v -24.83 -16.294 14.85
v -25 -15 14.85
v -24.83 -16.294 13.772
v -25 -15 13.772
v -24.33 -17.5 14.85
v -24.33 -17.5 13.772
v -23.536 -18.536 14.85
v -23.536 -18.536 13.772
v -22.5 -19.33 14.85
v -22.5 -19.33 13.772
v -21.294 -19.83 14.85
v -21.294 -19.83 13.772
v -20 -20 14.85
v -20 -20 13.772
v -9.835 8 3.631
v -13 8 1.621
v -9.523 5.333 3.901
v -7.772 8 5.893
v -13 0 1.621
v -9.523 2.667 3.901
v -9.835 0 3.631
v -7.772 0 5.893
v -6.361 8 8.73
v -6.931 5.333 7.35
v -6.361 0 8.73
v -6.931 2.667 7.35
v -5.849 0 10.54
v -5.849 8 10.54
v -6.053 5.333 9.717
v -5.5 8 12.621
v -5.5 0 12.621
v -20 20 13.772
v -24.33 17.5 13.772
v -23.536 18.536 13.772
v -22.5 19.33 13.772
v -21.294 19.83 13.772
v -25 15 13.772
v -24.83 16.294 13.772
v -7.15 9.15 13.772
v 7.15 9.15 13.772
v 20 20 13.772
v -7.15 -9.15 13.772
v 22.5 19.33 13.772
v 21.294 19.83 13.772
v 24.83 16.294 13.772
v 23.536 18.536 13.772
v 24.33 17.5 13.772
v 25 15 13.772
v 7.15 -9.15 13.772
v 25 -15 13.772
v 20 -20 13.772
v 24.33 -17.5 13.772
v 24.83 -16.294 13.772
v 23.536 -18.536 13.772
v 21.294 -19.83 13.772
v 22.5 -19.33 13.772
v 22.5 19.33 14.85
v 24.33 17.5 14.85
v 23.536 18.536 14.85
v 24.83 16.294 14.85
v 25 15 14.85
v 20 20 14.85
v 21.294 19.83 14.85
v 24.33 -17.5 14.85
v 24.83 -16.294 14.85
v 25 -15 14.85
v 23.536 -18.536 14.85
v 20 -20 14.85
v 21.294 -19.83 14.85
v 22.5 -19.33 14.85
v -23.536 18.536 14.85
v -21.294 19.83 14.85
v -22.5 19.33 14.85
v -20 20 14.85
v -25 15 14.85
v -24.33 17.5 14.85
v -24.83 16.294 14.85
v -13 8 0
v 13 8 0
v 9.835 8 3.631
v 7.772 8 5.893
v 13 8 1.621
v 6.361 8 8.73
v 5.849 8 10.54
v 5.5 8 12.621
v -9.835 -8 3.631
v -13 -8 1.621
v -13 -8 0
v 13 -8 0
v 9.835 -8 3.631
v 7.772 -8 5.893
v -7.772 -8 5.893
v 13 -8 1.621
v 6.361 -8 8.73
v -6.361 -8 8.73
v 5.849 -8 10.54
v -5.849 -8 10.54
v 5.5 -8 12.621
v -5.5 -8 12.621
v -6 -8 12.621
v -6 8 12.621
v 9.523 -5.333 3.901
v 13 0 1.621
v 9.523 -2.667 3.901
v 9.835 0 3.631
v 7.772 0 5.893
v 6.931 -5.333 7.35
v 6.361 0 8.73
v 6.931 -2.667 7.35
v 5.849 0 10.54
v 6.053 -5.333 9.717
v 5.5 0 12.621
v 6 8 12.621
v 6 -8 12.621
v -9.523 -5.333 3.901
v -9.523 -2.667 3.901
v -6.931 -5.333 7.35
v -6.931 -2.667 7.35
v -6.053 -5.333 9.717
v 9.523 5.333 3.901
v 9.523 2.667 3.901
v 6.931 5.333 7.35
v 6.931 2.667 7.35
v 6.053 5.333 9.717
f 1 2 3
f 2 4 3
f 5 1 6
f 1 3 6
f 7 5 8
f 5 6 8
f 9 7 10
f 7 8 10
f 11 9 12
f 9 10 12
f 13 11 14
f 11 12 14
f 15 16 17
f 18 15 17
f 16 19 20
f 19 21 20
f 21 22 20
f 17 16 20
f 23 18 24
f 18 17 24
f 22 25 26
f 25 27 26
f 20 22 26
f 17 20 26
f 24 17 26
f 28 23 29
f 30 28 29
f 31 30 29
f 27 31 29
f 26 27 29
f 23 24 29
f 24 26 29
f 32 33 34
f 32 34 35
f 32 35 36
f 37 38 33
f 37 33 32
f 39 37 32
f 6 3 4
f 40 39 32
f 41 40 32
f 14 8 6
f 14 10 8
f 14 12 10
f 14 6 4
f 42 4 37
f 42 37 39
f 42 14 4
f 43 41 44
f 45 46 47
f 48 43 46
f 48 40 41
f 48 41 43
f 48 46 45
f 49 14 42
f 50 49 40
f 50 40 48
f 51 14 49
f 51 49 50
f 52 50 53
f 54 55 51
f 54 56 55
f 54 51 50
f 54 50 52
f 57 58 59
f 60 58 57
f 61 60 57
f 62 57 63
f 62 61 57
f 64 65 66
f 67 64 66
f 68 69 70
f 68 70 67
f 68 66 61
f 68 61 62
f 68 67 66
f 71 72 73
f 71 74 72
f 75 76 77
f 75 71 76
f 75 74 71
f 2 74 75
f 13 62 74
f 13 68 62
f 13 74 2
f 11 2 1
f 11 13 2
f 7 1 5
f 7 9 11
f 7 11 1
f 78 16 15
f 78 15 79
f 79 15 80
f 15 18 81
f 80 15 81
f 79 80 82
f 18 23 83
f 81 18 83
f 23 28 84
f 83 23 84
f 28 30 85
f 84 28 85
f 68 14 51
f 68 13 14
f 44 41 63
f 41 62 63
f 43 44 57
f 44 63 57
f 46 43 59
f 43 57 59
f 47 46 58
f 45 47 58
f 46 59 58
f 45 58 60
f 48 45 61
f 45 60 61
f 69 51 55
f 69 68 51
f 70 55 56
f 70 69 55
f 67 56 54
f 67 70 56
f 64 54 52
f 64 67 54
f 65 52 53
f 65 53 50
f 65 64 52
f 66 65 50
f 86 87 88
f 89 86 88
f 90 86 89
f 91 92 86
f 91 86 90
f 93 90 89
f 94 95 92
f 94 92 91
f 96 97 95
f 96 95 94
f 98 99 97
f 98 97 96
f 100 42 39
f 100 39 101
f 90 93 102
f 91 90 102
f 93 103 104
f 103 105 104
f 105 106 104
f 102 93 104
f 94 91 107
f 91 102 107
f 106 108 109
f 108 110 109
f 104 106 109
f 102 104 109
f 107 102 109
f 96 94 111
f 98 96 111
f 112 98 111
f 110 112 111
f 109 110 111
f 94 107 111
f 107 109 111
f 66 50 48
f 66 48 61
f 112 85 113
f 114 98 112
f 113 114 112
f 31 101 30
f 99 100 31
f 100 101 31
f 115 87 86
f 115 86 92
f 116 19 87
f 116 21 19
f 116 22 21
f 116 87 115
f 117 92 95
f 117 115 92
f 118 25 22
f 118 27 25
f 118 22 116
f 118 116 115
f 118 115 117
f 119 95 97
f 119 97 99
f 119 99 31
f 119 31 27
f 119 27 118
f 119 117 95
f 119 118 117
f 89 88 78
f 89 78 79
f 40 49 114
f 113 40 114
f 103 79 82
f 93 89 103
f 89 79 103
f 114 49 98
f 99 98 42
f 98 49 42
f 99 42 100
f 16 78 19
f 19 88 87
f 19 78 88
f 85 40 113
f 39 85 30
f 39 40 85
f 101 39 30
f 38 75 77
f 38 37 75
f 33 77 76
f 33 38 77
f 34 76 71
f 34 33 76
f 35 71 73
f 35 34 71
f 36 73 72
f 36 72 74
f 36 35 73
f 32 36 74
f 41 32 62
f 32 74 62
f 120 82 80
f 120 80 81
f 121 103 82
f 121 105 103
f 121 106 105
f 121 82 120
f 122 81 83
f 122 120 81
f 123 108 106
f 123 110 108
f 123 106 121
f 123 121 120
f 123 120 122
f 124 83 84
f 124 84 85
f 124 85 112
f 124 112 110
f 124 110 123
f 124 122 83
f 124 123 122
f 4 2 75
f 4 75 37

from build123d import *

# Parameters (mm, degrees)
F1_DEPTH     = 20
F2_DEPTH     = 13
F0_W         = 13
F0_H         = 1.6210871795
F3_T4_DEPTH  = 22
F3_T9_DEPTH  = 26
F3_T14_DEPTH = 26
F3_T19_DEPTH = 22
F3_T25_DEPTH = 38.8584149398
F3_T30_DEPTH = 34.8584149398
F3_T38_DEPTH = 34.8584149398
F3_T43_DEPTH = 38.8584149398
F3_T51_DEPTH = 38.8584149398
F3_T56_DEPTH = 34.8584149398
F3_T64_DEPTH = 38.8584149398
F3_T69_DEPTH = 34.8584149398
F4_R         = 5
F5_R         = 5
F7_DEPTH     = 8


# Not quite as in the source:
# - a fillet or chamfer that OpenCascade refuses, or shapes differently, is made with other operations: its cross-section is extruded or revolved along the edge and cut away or added


with BuildPart() as f1:
    # F0 (on Front) → F1 (new body, symmetric)
    with BuildSketch(Plane.XZ):
        Polygon((0, 13.7715177082), (0, 14.85), (-25, 14.85), (-25, 13.7715177082), (-11, 13.7715177082), align=None)
        Polygon((25, 14.85), (0, 14.85), (0, 13.7715177082), (11, 13.7715177082), (25, 13.7715177082), align=None)
    extrude(amount=F1_DEPTH, both=True)

    # F0 (on Front) → F2 (join, symmetric)
    with BuildSketch(Plane.XZ):
        Polygon((0, 12.6210871795), (0, 13.7715177082), (-11, 13.7715177082), (-11, 12.6210871795), (-5.5, 12.6210871795), align=None)
        Polygon((11, 13.7715177082), (0, 13.7715177082), (0, 12.6210871795), (5.5, 12.6210871795), (11, 12.6210871795), align=None)
    extrude(amount=F2_DEPTH, both=True)

    # F3: chamfer of 5 on 4 edges, made by hand


with BuildPart() as f2:
    # F0 (on Front) → F2, piece 2 (new body, symmetric)
    with BuildSketch(Plane.XZ):
        with Locations((-6.5, 0.8105435898)):
            Rectangle(F0_W, F0_H)
        with Locations((6.5, 0.8105435898)):
            Rectangle(F0_W, F0_H)
    extrude(amount=F2_DEPTH, both=True)

    # F4
    f4_edges = [f2.edges().sort_by_distance(p)[0] for p in [
        (-13, 13, 0.810544),
        (-13, -13, 0.810544),
        (13, -13, 0.810544),
        (13, 13, 0.810544),
    ]]
    fillet(f4_edges, radius=F4_R)


with BuildPart() as f3_tool2:
    # F3_s3 → F3_t4 (new body)
    with BuildSketch(Plane.YZ.offset(-11)):
        with BuildLine():
            Line((13.1414213562, 17.7625085358), (7.8585786438, 12.4796658233))
            Line((7.8585786438, 12.4796658233), (7.8585786438, 12.3796658233))
            ThreePointArc((7.8585786438, 12.3796658233), (10.4292893219, 12.5210871795), (13, 12.5210871795))
            Line((13, 12.5210871795), (13.1, 12.6210871795))
            ThreePointArc((13.1, 12.6210871795), (13.1, 15.1917978577), (13.2414213562, 17.7625085358))
            Line((13.2414213562, 17.7625085358), (13.1414213562, 17.7625085358))
        make_face()
    extrude(amount=F3_T4_DEPTH)

    split(bisect_by=Plane.XY.offset(13.7715177082), keep=Keep.BOTTOM)


with BuildPart() as f1_1:
    add(f1.part)

    # F3_t1: cut F3_tool2
    add(f3_tool2.part, mode=Mode.SUBTRACT)


with BuildPart() as f3_tool7:
    # F3_s8 → F3_t9 (new body)
    with BuildSketch(Plane.XZ.offset(-13)):
        with BuildLine():
            Line((-11.1414213562, 17.7625085358), (-5.8585786438, 12.4796658233))
            Line((-5.8585786438, 12.4796658233), (-5.8585786438, 12.3796658233))
            ThreePointArc((-5.8585786438, 12.3796658233), (-8.4292893219, 12.5210871795), (-11, 12.5210871795))
            Line((-11, 12.5210871795), (-11.1, 12.6210871795))
            ThreePointArc((-11.1, 12.6210871795), (-11.1, 15.1917978577), (-11.2414213562, 17.7625085358))
            Line((-11.2414213562, 17.7625085358), (-11.1414213562, 17.7625085358))
        make_face()
    extrude(amount=F3_T9_DEPTH)

    split(bisect_by=Plane.XY.offset(13.7715177082), keep=Keep.BOTTOM)


with BuildPart() as f1_2:
    add(f1_1.part)

    # F3_t6: cut F3_tool7
    add(f3_tool7.part, mode=Mode.SUBTRACT)


with BuildPart() as f3_tool12:
    # F3_s13 → F3_t14 (new body)
    with BuildSketch(Plane.XZ.offset(-13)):
        with BuildLine():
            Line((11.1414213562, 17.7625085358), (5.8585786438, 12.4796658233))
            Line((5.8585786438, 12.4796658233), (5.8585786438, 12.3796658233))
            ThreePointArc((5.8585786438, 12.3796658233), (8.4292893219, 12.5210871795), (11, 12.5210871795))
            Line((11, 12.5210871795), (11.1, 12.6210871795))
            ThreePointArc((11.1, 12.6210871795), (11.1, 15.1917978577), (11.2414213562, 17.7625085358))
            Line((11.2414213562, 17.7625085358), (11.1414213562, 17.7625085358))
        make_face()
    extrude(amount=F3_T14_DEPTH)

    split(bisect_by=Plane.XY.offset(13.7715177082), keep=Keep.BOTTOM)


with BuildPart() as f1_3:
    add(f1_2.part)

    # F3_t11: cut F3_tool12
    add(f3_tool12.part, mode=Mode.SUBTRACT)


with BuildPart() as f3_tool17:
    # F3_s18 → F3_t19 (new body)
    with BuildSketch(Plane.YZ.offset(-11)):
        with BuildLine():
            Line((-13.1414213562, 17.7625085358), (-7.8585786438, 12.4796658233))
            Line((-7.8585786438, 12.4796658233), (-7.8585786438, 12.3796658233))
            ThreePointArc((-7.8585786438, 12.3796658233), (-10.4292893219, 12.5210871795), (-13, 12.5210871795))
            Line((-13, 12.5210871795), (-13.1, 12.6210871795))
            ThreePointArc((-13.1, 12.6210871795), (-13.1, 15.1917978577), (-13.2414213562, 17.7625085358))
            Line((-13.2414213562, 17.7625085358), (-13.1414213562, 17.7625085358))
        make_face()
    extrude(amount=F3_T19_DEPTH)

    split(bisect_by=Plane.XY.offset(13.7715177082), keep=Keep.BOTTOM)


with BuildPart() as f1_4:
    add(f1_3.part)

    # F3_t16: cut F3_tool17
    add(f3_tool17.part, mode=Mode.SUBTRACT)


with BuildPart() as f3_tool23:
    # F3_s24 → F3_t25 (new body)
    with BuildSketch(Plane.XZ.offset(-25.8584149398)):
        with BuildLine():
            Line((-11.1414213562, 17.7625085358), (-5.8585786438, 12.4796658233))
            Line((-5.8585786438, 12.4796658233), (-5.8585786438, 12.3796658233))
            ThreePointArc((-5.8585786438, 12.3796658233), (-8.4292893219, 12.5210871795), (-11, 12.5210871795))
            Line((-11, 12.5210871795), (-11.1, 12.6210871795))
            ThreePointArc((-11.1, 12.6210871795), (-11.1, 15.1917978577), (-11.2414213562, 17.7625085358))
            Line((-11.2414213562, 17.7625085358), (-11.1414213562, 17.7625085358))
        make_face()
    extrude(amount=F3_T25_DEPTH)

    split(bisect_by=Plane.XY.offset(13.7715177082), keep=Keep.BOTTOM)

    split(bisect_by=Plane.XZ.offset(-13), keep=Keep.BOTTOM)


with BuildPart() as f3_tool28:
    # F3_s29 → F3_t30 (new body)
    with BuildSketch(Plane.YZ.offset(-23.8584149398)):
        with BuildLine():
            Line((13.1414213562, 17.7625085358), (7.8585786438, 12.4796658233))
            Line((7.8585786438, 12.4796658233), (7.8585786438, 12.3796658233))
            ThreePointArc((7.8585786438, 12.3796658233), (10.4292893219, 12.5210871795), (13, 12.5210871795))
            Line((13, 12.5210871795), (13.1, 12.6210871795))
            ThreePointArc((13.1, 12.6210871795), (13.1, 15.1917978577), (13.2414213562, 17.7625085358))
            Line((13.2414213562, 17.7625085358), (13.1414213562, 17.7625085358))
        make_face()
    extrude(amount=F3_T30_DEPTH)

    split(bisect_by=Plane.XY.offset(13.7715177082), keep=Keep.BOTTOM)

    split(bisect_by=Plane.YZ.offset(-11), keep=Keep.BOTTOM)


with BuildPart() as f3_tool23_1:
    add(f3_tool23.part)

    # F3_t33: intersect F3_tool28
    add(f3_tool28.part, mode=Mode.INTERSECT)


with BuildPart() as f1_5:
    add(f1_4.part)

    # F3_t21: cut F3_tool23
    add(f3_tool23_1.part, mode=Mode.SUBTRACT)


with BuildPart() as f3_tool36:
    # F3_s37 → F3_t38 (new body)
    with BuildSketch(Plane.YZ.offset(-11)):
        with BuildLine():
            Line((13.1414213562, 17.7625085358), (7.8585786438, 12.4796658233))
            Line((7.8585786438, 12.4796658233), (7.8585786438, 12.3796658233))
            ThreePointArc((7.8585786438, 12.3796658233), (10.4292893219, 12.5210871795), (13, 12.5210871795))
            Line((13, 12.5210871795), (13.1, 12.6210871795))
            ThreePointArc((13.1, 12.6210871795), (13.1, 15.1917978577), (13.2414213562, 17.7625085358))
            Line((13.2414213562, 17.7625085358), (13.1414213562, 17.7625085358))
        make_face()
    extrude(amount=F3_T38_DEPTH)

    split(bisect_by=Plane.XY.offset(13.7715177082), keep=Keep.BOTTOM)

    split(bisect_by=Plane.YZ.offset(11), keep=Keep.TOP)


with BuildPart() as f3_tool41:
    # F3_s42 → F3_t43 (new body)
    with BuildSketch(Plane.XZ.offset(-25.8584149398)):
        with BuildLine():
            Line((11.1414213562, 17.7625085358), (5.8585786438, 12.4796658233))
            Line((5.8585786438, 12.4796658233), (5.8585786438, 12.3796658233))
            ThreePointArc((5.8585786438, 12.3796658233), (8.4292893219, 12.5210871795), (11, 12.5210871795))
            Line((11, 12.5210871795), (11.1, 12.6210871795))
            ThreePointArc((11.1, 12.6210871795), (11.1, 15.1917978577), (11.2414213562, 17.7625085358))
            Line((11.2414213562, 17.7625085358), (11.1414213562, 17.7625085358))
        make_face()
    extrude(amount=F3_T43_DEPTH)

    split(bisect_by=Plane.XY.offset(13.7715177082), keep=Keep.BOTTOM)

    split(bisect_by=Plane.XZ.offset(-13), keep=Keep.BOTTOM)


with BuildPart() as f3_tool36_1:
    add(f3_tool36.part)

    # F3_t46: intersect F3_tool41
    add(f3_tool41.part, mode=Mode.INTERSECT)


with BuildPart() as f1_6:
    add(f1_5.part)

    # F3_t34: cut F3_tool36
    add(f3_tool36_1.part, mode=Mode.SUBTRACT)


with BuildPart() as f3_tool49:
    # F3_s50 → F3_t51 (new body)
    with BuildSketch(Plane.XZ.offset(-13)):
        with BuildLine():
            Line((-11.1414213562, 17.7625085358), (-5.8585786438, 12.4796658233))
            Line((-5.8585786438, 12.4796658233), (-5.8585786438, 12.3796658233))
            ThreePointArc((-5.8585786438, 12.3796658233), (-8.4292893219, 12.5210871795), (-11, 12.5210871795))
            Line((-11, 12.5210871795), (-11.1, 12.6210871795))
            ThreePointArc((-11.1, 12.6210871795), (-11.1, 15.1917978577), (-11.2414213562, 17.7625085358))
            Line((-11.2414213562, 17.7625085358), (-11.1414213562, 17.7625085358))
        make_face()
    extrude(amount=F3_T51_DEPTH)

    split(bisect_by=Plane.XY.offset(13.7715177082), keep=Keep.BOTTOM)

    split(bisect_by=Plane.XZ.offset(13), keep=Keep.TOP)


with BuildPart() as f3_tool54:
    # F3_s55 → F3_t56 (new body)
    with BuildSketch(Plane.YZ.offset(-23.8584149398)):
        with BuildLine():
            Line((-13.1414213562, 17.7625085358), (-7.8585786438, 12.4796658233))
            Line((-7.8585786438, 12.4796658233), (-7.8585786438, 12.3796658233))
            ThreePointArc((-7.8585786438, 12.3796658233), (-10.4292893219, 12.5210871795), (-13, 12.5210871795))
            Line((-13, 12.5210871795), (-13.1, 12.6210871795))
            ThreePointArc((-13.1, 12.6210871795), (-13.1, 15.1917978577), (-13.2414213562, 17.7625085358))
            Line((-13.2414213562, 17.7625085358), (-13.1414213562, 17.7625085358))
        make_face()
    extrude(amount=F3_T56_DEPTH)

    split(bisect_by=Plane.XY.offset(13.7715177082), keep=Keep.BOTTOM)

    split(bisect_by=Plane.YZ.offset(-11), keep=Keep.BOTTOM)


with BuildPart() as f3_tool49_1:
    add(f3_tool49.part)

    # F3_t59: intersect F3_tool54
    add(f3_tool54.part, mode=Mode.INTERSECT)


with BuildPart() as f1_7:
    add(f1_6.part)

    # F3_t47: cut F3_tool49
    add(f3_tool49_1.part, mode=Mode.SUBTRACT)


with BuildPart() as f3_tool62:
    # F3_s63 → F3_t64 (new body)
    with BuildSketch(Plane.XZ.offset(-13)):
        with BuildLine():
            Line((11.1414213562, 17.7625085358), (5.8585786438, 12.4796658233))
            Line((5.8585786438, 12.4796658233), (5.8585786438, 12.3796658233))
            ThreePointArc((5.8585786438, 12.3796658233), (8.4292893219, 12.5210871795), (11, 12.5210871795))
            Line((11, 12.5210871795), (11.1, 12.6210871795))
            ThreePointArc((11.1, 12.6210871795), (11.1, 15.1917978577), (11.2414213562, 17.7625085358))
            Line((11.2414213562, 17.7625085358), (11.1414213562, 17.7625085358))
        make_face()
    extrude(amount=F3_T64_DEPTH)

    split(bisect_by=Plane.XY.offset(13.7715177082), keep=Keep.BOTTOM)

    split(bisect_by=Plane.XZ.offset(13), keep=Keep.TOP)


with BuildPart() as f3_tool67:
    # F3_s68 → F3_t69 (new body)
    with BuildSketch(Plane.YZ.offset(-11)):
        with BuildLine():
            Line((-13.1414213562, 17.7625085358), (-7.8585786438, 12.4796658233))
            Line((-7.8585786438, 12.4796658233), (-7.8585786438, 12.3796658233))
            ThreePointArc((-7.8585786438, 12.3796658233), (-10.4292893219, 12.5210871795), (-13, 12.5210871795))
            Line((-13, 12.5210871795), (-13.1, 12.6210871795))
            ThreePointArc((-13.1, 12.6210871795), (-13.1, 15.1917978577), (-13.2414213562, 17.7625085358))
            Line((-13.2414213562, 17.7625085358), (-13.1414213562, 17.7625085358))
        make_face()
    extrude(amount=F3_T69_DEPTH)

    split(bisect_by=Plane.XY.offset(13.7715177082), keep=Keep.BOTTOM)

    split(bisect_by=Plane.YZ.offset(11), keep=Keep.TOP)


with BuildPart() as f3_tool62_1:
    add(f3_tool62.part)

    # F3_t72: intersect F3_tool67
    add(f3_tool67.part, mode=Mode.INTERSECT)


with BuildPart() as f1_8:
    add(f1_7.part)

    # F3_t60: cut F3_tool62
    add(f3_tool62_1.part, mode=Mode.SUBTRACT)

    # F5
    f5_edges = [f1_8.edges().sort_by_distance(p)[0] for p in [
        (-25, -20, 14.310759),
        (-25, 20, 14.310759),
        (25, -20, 14.310759),
        (25, 20, 14.310759),
    ]]
    fillet(f5_edges, radius=F5_R)

    # F0 (on Front) → F7 (join, symmetric)
    with BuildSketch(Plane.XZ):
        with BuildLine():
            Line((0, 1.6210871795), (0, 12.6210871795))
            Line((0, 12.6210871795), (-5.5, 12.6210871795))
            add(Edge.make_bspline(
                [(-13, 1.6210871795), (-9.1716769267, 3.5339947176), (-6.259098086, 6.2224261798), (-5.5, 12.6210871795)],
                knots=[0, 0, 0, 0, 13.3135269557, 13.3135269557, 13.3135269557, 13.3135269557], degree=3))
            Line((-13, 1.6210871795), (0, 1.6210871795))
        make_face()
        with Locations((-6.5, 0.8105435898)):
            Rectangle(F0_W, F0_H)
        with BuildLine():
            Line((5.5, 12.6210871795), (0, 12.6210871795))
            Line((0, 12.6210871795), (0, 1.6210871795))
            Line((0, 1.6210871795), (13, 1.6210871795))
            add(Edge.make_bspline(
                [(13, 1.6210871795), (9.1716769267, 3.5339947176), (6.259098086, 6.2224261798), (5.5, 12.6210871795)],
                knots=[0, 0, 0, 0, 13.3135269557, 13.3135269557, 13.3135269557, 13.3135269557], degree=3))
        make_face()
        with Locations((6.5, 0.8105435898)):
            Rectangle(F0_W, F0_H)
    extrude(amount=F7_DEPTH, both=True)


solid = f1_8.part
